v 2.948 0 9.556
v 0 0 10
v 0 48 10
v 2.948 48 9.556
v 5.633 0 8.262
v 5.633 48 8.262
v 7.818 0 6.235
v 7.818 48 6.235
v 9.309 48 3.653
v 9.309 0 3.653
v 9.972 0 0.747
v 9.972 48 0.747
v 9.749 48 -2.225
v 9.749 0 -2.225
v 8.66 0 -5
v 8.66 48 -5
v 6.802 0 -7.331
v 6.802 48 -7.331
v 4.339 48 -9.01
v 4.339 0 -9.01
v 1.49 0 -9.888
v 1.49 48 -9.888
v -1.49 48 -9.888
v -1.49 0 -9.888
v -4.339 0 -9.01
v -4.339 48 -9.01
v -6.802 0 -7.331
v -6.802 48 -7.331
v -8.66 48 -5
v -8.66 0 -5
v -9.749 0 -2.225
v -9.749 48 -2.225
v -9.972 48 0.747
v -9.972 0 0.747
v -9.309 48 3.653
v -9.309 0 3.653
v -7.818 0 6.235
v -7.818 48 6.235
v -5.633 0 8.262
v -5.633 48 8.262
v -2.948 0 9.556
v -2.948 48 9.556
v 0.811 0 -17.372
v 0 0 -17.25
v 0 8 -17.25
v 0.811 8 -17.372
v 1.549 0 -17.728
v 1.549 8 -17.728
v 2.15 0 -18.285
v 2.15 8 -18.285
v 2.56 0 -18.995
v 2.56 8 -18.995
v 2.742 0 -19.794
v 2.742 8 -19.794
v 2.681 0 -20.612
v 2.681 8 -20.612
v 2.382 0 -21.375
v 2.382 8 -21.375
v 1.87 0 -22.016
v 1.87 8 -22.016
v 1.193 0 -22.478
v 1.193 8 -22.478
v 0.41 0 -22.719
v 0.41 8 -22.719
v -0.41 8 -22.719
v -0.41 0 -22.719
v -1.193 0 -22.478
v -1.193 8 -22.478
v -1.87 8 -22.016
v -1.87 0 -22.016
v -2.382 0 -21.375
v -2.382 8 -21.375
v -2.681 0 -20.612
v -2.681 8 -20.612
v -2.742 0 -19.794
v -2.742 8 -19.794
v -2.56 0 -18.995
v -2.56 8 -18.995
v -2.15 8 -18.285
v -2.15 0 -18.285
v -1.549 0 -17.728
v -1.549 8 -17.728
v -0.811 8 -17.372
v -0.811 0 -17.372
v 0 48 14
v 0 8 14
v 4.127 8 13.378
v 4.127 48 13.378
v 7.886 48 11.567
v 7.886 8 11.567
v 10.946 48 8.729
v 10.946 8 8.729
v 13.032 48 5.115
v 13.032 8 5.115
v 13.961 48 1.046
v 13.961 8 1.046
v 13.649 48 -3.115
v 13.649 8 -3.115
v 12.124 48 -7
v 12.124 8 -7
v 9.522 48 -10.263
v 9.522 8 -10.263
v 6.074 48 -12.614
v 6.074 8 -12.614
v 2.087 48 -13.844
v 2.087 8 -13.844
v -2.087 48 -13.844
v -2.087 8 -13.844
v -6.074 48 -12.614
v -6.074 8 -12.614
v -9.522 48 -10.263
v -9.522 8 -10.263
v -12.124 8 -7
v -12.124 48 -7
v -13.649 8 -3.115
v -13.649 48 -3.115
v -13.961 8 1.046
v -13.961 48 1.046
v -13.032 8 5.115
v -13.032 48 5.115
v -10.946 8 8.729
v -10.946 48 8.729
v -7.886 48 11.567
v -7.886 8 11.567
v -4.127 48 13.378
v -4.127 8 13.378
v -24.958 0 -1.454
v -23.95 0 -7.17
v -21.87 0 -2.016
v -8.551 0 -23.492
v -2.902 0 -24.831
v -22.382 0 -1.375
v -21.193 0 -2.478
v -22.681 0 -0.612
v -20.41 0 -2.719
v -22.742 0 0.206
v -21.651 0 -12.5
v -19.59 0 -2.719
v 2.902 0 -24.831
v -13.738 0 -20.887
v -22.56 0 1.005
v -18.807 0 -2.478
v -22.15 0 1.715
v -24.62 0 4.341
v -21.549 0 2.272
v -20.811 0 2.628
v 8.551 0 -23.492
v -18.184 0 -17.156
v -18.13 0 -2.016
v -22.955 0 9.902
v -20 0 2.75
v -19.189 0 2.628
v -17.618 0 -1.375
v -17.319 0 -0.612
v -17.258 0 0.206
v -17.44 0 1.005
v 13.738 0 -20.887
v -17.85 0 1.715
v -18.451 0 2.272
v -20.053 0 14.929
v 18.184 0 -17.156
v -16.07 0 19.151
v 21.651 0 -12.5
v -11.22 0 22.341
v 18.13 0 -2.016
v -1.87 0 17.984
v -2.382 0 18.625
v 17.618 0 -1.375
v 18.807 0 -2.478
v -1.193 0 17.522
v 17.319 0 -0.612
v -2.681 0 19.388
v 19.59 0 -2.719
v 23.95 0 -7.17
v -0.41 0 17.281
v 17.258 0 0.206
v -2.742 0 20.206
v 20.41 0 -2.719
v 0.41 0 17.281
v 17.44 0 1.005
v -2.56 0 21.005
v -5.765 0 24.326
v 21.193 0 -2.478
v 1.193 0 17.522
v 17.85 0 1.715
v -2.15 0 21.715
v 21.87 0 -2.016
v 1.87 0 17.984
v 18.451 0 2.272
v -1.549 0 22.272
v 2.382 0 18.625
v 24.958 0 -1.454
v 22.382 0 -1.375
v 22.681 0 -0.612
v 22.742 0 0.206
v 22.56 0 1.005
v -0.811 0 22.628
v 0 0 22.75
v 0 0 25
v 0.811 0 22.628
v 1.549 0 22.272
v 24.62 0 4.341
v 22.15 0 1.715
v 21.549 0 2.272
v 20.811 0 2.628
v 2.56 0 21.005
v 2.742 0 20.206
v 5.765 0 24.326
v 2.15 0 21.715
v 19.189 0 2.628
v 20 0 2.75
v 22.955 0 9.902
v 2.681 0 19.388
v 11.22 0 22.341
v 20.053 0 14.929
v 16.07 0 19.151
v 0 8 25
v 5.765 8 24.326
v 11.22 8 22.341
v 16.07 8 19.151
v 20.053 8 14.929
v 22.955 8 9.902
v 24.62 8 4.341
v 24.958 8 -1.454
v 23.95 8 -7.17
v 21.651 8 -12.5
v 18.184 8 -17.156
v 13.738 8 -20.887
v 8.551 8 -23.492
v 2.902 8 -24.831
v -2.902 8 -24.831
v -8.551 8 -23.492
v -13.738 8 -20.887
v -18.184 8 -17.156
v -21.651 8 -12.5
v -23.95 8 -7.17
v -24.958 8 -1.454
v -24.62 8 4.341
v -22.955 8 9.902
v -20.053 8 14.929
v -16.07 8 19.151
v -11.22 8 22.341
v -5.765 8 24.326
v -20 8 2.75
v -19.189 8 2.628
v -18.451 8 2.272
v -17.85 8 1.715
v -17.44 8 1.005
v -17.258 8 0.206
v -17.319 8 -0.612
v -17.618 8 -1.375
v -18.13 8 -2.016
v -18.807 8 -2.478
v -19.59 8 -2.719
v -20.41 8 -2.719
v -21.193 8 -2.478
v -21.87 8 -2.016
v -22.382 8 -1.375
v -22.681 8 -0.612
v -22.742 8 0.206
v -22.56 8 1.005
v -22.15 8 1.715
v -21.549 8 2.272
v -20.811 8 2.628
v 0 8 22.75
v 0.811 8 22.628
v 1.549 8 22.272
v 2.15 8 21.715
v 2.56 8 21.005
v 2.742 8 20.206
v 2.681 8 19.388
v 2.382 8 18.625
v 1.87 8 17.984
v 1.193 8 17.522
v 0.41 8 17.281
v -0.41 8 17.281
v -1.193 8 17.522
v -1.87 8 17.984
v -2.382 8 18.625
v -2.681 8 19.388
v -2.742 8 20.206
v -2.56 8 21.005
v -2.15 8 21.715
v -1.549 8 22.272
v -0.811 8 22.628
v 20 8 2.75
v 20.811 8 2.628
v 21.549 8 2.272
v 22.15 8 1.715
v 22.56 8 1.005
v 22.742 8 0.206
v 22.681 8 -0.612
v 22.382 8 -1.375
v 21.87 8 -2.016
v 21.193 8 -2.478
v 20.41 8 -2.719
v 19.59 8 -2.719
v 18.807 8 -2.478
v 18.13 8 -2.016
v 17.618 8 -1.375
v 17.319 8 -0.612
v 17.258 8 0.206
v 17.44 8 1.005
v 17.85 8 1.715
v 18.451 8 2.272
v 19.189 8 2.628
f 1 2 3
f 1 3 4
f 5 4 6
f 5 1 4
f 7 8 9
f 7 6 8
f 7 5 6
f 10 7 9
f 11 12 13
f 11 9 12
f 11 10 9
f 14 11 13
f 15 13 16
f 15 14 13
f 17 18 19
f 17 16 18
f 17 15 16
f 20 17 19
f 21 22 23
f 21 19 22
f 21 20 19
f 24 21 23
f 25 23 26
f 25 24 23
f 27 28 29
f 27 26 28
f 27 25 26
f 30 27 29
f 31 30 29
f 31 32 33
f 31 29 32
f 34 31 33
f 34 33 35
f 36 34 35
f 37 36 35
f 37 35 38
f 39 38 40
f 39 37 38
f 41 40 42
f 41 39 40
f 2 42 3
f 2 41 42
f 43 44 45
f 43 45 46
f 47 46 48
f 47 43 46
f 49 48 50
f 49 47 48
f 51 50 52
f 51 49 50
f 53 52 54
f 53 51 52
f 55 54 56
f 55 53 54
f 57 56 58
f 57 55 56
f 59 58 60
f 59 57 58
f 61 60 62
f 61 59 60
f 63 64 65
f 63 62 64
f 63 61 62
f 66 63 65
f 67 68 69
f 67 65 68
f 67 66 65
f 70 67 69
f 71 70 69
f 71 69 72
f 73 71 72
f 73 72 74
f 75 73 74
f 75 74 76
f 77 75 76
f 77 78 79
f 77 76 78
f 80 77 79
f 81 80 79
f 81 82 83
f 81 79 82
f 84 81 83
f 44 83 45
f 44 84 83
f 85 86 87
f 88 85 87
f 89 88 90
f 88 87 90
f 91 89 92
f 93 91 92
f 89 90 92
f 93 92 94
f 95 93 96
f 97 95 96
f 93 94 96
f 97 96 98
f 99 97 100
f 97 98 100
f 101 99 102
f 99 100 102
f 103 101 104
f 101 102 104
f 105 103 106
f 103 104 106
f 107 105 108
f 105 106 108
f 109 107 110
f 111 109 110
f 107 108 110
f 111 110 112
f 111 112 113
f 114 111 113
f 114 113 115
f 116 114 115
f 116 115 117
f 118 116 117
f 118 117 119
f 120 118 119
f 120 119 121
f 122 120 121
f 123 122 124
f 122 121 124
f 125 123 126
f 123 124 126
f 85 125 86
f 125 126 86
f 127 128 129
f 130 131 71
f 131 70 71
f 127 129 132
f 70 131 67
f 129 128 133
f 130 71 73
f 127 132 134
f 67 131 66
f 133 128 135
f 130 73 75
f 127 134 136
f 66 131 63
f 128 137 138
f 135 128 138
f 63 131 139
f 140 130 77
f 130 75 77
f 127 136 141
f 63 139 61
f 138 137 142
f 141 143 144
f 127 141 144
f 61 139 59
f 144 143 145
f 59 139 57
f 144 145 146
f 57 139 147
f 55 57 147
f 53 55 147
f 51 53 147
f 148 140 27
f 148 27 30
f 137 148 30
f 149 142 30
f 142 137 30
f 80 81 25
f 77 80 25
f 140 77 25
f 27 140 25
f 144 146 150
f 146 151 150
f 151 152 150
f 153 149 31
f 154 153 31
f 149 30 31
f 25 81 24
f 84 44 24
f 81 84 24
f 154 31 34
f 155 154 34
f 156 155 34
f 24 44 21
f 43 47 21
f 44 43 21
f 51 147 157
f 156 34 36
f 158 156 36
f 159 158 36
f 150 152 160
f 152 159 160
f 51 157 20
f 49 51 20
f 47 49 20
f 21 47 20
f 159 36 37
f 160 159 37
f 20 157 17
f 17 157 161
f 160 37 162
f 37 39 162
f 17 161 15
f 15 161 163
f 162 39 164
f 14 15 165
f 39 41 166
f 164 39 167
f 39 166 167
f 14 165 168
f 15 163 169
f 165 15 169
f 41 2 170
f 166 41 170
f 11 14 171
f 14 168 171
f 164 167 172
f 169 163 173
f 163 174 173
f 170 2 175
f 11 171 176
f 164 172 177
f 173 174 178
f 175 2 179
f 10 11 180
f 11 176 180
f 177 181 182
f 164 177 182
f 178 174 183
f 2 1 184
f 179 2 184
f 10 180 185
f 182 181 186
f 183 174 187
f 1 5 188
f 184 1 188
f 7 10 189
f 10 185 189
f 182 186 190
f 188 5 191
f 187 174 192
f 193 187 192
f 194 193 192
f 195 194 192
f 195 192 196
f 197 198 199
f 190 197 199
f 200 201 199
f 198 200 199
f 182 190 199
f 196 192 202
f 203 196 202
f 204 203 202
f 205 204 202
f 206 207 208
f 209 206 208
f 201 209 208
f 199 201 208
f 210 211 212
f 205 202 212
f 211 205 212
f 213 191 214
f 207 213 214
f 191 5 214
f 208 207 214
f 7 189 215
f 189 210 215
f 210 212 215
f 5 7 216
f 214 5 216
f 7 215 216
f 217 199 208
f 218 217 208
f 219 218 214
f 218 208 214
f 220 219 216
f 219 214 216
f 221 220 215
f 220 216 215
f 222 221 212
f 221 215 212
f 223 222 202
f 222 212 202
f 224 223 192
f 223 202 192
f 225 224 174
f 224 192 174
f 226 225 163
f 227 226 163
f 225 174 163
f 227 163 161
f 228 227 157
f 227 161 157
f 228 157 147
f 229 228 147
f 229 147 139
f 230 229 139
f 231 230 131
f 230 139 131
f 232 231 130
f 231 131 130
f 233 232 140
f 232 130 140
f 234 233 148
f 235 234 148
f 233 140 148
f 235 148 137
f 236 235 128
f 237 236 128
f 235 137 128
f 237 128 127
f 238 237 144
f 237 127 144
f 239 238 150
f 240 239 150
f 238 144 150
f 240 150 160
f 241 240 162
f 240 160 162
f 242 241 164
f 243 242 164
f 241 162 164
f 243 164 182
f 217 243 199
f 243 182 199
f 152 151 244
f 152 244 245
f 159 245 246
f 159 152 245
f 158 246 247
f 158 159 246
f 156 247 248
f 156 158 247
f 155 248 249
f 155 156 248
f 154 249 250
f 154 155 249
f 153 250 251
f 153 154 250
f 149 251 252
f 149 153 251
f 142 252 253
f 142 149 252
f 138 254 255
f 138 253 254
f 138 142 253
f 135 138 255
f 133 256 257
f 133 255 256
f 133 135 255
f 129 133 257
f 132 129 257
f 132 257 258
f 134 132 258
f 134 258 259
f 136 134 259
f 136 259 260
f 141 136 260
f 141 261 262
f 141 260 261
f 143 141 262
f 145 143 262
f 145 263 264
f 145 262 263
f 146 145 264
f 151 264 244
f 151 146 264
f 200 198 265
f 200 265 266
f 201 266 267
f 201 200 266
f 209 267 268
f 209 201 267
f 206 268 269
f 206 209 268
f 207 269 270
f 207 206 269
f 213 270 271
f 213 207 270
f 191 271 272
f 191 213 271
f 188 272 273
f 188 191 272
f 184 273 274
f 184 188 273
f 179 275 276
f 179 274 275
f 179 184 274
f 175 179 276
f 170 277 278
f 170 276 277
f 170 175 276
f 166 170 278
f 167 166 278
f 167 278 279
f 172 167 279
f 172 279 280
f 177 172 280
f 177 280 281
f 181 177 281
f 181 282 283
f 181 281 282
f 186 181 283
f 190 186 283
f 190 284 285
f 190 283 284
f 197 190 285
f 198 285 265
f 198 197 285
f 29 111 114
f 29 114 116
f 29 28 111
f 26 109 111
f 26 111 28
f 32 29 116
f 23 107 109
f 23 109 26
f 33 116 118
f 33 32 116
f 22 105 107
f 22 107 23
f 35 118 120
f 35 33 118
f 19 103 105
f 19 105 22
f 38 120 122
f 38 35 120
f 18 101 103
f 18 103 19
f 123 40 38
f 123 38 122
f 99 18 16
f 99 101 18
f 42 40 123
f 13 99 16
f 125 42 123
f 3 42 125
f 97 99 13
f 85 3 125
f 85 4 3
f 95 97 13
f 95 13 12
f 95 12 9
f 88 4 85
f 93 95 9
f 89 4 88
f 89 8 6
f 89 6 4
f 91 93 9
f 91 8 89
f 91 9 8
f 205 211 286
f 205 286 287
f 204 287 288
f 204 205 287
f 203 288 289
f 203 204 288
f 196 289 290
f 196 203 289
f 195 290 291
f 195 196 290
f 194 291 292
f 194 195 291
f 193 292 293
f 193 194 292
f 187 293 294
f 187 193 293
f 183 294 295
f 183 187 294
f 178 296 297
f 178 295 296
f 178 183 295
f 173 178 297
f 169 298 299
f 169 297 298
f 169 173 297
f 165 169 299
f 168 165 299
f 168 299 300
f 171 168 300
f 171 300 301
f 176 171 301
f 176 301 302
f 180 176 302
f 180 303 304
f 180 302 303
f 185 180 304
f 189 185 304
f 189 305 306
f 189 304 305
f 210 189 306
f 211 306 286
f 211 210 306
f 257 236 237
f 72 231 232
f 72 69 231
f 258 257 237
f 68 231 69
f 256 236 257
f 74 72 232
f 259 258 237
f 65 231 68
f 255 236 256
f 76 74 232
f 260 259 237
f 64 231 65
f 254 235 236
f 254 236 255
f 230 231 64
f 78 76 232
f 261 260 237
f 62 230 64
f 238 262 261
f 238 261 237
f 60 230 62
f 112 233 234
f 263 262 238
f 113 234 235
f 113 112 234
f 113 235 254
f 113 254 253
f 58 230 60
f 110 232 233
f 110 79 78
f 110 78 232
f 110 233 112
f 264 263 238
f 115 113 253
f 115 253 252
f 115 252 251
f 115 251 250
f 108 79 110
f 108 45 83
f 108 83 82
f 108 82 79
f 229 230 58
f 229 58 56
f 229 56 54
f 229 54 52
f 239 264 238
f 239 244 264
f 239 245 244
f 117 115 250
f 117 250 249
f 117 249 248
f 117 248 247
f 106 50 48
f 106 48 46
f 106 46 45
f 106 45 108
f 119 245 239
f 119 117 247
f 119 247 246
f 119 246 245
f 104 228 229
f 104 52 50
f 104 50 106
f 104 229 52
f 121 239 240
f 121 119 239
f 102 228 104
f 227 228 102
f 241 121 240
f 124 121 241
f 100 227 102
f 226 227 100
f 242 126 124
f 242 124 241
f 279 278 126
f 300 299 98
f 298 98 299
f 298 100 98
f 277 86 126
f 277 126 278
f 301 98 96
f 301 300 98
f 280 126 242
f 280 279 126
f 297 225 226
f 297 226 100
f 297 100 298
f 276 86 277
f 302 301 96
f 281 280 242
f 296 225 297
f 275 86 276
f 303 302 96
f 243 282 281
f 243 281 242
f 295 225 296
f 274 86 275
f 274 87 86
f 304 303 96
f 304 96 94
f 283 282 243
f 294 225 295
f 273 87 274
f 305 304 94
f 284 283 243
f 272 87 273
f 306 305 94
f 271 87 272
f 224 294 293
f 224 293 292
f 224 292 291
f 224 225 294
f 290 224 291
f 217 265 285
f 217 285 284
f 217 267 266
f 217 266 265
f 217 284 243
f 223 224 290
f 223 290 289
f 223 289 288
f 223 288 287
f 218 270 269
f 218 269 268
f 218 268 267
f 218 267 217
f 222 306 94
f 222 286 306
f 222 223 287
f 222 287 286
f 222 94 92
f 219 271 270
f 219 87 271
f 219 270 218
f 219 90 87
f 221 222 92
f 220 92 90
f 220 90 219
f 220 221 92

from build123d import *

# Parameters (mm, degrees)
ESQUISSE1_R                  = 25
BOSS_EXTRU_1_DEPTH           = 8
ESQUISSE2_R                  = 14
BOSS_EXTRU_2_DEPTH           = 40
ENL_V_MAT_EXTRU_1_DEPTH      = 60.615434243
ENL_V_MAT_EXTRU_1_DEPTH_BACK = 60.615434243
ESQUISSE3_R                  = 10
ENL_V_MAT_EXTRU_2_DEPTH      = 54.38539126
ENL_V_MAT_EXTRU_2_DEPTH_BACK = 54.38539126
ESQUISSE4_R                  = 2.75


with BuildPart() as part:
    # Esquisse1 → Boss.-Extru.1 (new body)
    with BuildSketch(Plane(origin=(0, 0, 0), x_dir=(1, 0, 0), z_dir=(0, 1, 0))):
        with Locations(Location((0, 0, 0), (0, 0, 270))):
            Circle(ESQUISSE1_R)
    extrude(amount=BOSS_EXTRU_1_DEPTH)

    # Esquisse2 → Boss.-Extru.2 (add)
    with BuildSketch(Plane(origin=(0, 8, 0), x_dir=(1, 0, 0), z_dir=(0, 1, 0))):
        with Locations(Location((0, 0, 0), (0, 0, 270))):
            Circle(ESQUISSE2_R)
    extrude(amount=BOSS_EXTRU_2_DEPTH)

    # Esquisse3 → Enlèv. mat.-Extru.1 (cut, two sides: drawn at the far end of the back side and taken through both)
    with BuildSketch(Plane(origin=(0, 48, 0), x_dir=(1, 0, 0), z_dir=(0, 1, 0)).offset(-ENL_V_MAT_EXTRU_1_DEPTH_BACK)):
        with Locations(Location((0, 0, 0), (0, 0, 270))):
            Circle(ESQUISSE3_R)
    extrude(amount=ENL_V_MAT_EXTRU_1_DEPTH + ENL_V_MAT_EXTRU_1_DEPTH_BACK, mode=Mode.SUBTRACT)

    # Esquisse4 → Enlèv. mat.-Extru.2 (cut, two sides: drawn at the far end of the back side and taken through both)
    with BuildSketch(Plane(origin=(0, 8, 0), x_dir=(1, 0, 0), z_dir=(0, 1, 0)).offset(-ENL_V_MAT_EXTRU_2_DEPTH_BACK)):
        with Locations(Location((0, 20, 0), (0, 0, 270))):
            Circle(ESQUISSE4_R)
        with Locations(Location((20, 0, 0), (0, 0, 270))):
            Circle(ESQUISSE4_R)
        with Locations(Location((0, -20, 0), (0, 0, 270))):
            Circle(ESQUISSE4_R)
        with Locations(Location((-20, 0, 0), (0, 0, 270))):
            Circle(ESQUISSE4_R)
    extrude(amount=ENL_V_MAT_EXTRU_2_DEPTH + ENL_V_MAT_EXTRU_2_DEPTH_BACK, mode=Mode.SUBTRACT)


solid = part.part
